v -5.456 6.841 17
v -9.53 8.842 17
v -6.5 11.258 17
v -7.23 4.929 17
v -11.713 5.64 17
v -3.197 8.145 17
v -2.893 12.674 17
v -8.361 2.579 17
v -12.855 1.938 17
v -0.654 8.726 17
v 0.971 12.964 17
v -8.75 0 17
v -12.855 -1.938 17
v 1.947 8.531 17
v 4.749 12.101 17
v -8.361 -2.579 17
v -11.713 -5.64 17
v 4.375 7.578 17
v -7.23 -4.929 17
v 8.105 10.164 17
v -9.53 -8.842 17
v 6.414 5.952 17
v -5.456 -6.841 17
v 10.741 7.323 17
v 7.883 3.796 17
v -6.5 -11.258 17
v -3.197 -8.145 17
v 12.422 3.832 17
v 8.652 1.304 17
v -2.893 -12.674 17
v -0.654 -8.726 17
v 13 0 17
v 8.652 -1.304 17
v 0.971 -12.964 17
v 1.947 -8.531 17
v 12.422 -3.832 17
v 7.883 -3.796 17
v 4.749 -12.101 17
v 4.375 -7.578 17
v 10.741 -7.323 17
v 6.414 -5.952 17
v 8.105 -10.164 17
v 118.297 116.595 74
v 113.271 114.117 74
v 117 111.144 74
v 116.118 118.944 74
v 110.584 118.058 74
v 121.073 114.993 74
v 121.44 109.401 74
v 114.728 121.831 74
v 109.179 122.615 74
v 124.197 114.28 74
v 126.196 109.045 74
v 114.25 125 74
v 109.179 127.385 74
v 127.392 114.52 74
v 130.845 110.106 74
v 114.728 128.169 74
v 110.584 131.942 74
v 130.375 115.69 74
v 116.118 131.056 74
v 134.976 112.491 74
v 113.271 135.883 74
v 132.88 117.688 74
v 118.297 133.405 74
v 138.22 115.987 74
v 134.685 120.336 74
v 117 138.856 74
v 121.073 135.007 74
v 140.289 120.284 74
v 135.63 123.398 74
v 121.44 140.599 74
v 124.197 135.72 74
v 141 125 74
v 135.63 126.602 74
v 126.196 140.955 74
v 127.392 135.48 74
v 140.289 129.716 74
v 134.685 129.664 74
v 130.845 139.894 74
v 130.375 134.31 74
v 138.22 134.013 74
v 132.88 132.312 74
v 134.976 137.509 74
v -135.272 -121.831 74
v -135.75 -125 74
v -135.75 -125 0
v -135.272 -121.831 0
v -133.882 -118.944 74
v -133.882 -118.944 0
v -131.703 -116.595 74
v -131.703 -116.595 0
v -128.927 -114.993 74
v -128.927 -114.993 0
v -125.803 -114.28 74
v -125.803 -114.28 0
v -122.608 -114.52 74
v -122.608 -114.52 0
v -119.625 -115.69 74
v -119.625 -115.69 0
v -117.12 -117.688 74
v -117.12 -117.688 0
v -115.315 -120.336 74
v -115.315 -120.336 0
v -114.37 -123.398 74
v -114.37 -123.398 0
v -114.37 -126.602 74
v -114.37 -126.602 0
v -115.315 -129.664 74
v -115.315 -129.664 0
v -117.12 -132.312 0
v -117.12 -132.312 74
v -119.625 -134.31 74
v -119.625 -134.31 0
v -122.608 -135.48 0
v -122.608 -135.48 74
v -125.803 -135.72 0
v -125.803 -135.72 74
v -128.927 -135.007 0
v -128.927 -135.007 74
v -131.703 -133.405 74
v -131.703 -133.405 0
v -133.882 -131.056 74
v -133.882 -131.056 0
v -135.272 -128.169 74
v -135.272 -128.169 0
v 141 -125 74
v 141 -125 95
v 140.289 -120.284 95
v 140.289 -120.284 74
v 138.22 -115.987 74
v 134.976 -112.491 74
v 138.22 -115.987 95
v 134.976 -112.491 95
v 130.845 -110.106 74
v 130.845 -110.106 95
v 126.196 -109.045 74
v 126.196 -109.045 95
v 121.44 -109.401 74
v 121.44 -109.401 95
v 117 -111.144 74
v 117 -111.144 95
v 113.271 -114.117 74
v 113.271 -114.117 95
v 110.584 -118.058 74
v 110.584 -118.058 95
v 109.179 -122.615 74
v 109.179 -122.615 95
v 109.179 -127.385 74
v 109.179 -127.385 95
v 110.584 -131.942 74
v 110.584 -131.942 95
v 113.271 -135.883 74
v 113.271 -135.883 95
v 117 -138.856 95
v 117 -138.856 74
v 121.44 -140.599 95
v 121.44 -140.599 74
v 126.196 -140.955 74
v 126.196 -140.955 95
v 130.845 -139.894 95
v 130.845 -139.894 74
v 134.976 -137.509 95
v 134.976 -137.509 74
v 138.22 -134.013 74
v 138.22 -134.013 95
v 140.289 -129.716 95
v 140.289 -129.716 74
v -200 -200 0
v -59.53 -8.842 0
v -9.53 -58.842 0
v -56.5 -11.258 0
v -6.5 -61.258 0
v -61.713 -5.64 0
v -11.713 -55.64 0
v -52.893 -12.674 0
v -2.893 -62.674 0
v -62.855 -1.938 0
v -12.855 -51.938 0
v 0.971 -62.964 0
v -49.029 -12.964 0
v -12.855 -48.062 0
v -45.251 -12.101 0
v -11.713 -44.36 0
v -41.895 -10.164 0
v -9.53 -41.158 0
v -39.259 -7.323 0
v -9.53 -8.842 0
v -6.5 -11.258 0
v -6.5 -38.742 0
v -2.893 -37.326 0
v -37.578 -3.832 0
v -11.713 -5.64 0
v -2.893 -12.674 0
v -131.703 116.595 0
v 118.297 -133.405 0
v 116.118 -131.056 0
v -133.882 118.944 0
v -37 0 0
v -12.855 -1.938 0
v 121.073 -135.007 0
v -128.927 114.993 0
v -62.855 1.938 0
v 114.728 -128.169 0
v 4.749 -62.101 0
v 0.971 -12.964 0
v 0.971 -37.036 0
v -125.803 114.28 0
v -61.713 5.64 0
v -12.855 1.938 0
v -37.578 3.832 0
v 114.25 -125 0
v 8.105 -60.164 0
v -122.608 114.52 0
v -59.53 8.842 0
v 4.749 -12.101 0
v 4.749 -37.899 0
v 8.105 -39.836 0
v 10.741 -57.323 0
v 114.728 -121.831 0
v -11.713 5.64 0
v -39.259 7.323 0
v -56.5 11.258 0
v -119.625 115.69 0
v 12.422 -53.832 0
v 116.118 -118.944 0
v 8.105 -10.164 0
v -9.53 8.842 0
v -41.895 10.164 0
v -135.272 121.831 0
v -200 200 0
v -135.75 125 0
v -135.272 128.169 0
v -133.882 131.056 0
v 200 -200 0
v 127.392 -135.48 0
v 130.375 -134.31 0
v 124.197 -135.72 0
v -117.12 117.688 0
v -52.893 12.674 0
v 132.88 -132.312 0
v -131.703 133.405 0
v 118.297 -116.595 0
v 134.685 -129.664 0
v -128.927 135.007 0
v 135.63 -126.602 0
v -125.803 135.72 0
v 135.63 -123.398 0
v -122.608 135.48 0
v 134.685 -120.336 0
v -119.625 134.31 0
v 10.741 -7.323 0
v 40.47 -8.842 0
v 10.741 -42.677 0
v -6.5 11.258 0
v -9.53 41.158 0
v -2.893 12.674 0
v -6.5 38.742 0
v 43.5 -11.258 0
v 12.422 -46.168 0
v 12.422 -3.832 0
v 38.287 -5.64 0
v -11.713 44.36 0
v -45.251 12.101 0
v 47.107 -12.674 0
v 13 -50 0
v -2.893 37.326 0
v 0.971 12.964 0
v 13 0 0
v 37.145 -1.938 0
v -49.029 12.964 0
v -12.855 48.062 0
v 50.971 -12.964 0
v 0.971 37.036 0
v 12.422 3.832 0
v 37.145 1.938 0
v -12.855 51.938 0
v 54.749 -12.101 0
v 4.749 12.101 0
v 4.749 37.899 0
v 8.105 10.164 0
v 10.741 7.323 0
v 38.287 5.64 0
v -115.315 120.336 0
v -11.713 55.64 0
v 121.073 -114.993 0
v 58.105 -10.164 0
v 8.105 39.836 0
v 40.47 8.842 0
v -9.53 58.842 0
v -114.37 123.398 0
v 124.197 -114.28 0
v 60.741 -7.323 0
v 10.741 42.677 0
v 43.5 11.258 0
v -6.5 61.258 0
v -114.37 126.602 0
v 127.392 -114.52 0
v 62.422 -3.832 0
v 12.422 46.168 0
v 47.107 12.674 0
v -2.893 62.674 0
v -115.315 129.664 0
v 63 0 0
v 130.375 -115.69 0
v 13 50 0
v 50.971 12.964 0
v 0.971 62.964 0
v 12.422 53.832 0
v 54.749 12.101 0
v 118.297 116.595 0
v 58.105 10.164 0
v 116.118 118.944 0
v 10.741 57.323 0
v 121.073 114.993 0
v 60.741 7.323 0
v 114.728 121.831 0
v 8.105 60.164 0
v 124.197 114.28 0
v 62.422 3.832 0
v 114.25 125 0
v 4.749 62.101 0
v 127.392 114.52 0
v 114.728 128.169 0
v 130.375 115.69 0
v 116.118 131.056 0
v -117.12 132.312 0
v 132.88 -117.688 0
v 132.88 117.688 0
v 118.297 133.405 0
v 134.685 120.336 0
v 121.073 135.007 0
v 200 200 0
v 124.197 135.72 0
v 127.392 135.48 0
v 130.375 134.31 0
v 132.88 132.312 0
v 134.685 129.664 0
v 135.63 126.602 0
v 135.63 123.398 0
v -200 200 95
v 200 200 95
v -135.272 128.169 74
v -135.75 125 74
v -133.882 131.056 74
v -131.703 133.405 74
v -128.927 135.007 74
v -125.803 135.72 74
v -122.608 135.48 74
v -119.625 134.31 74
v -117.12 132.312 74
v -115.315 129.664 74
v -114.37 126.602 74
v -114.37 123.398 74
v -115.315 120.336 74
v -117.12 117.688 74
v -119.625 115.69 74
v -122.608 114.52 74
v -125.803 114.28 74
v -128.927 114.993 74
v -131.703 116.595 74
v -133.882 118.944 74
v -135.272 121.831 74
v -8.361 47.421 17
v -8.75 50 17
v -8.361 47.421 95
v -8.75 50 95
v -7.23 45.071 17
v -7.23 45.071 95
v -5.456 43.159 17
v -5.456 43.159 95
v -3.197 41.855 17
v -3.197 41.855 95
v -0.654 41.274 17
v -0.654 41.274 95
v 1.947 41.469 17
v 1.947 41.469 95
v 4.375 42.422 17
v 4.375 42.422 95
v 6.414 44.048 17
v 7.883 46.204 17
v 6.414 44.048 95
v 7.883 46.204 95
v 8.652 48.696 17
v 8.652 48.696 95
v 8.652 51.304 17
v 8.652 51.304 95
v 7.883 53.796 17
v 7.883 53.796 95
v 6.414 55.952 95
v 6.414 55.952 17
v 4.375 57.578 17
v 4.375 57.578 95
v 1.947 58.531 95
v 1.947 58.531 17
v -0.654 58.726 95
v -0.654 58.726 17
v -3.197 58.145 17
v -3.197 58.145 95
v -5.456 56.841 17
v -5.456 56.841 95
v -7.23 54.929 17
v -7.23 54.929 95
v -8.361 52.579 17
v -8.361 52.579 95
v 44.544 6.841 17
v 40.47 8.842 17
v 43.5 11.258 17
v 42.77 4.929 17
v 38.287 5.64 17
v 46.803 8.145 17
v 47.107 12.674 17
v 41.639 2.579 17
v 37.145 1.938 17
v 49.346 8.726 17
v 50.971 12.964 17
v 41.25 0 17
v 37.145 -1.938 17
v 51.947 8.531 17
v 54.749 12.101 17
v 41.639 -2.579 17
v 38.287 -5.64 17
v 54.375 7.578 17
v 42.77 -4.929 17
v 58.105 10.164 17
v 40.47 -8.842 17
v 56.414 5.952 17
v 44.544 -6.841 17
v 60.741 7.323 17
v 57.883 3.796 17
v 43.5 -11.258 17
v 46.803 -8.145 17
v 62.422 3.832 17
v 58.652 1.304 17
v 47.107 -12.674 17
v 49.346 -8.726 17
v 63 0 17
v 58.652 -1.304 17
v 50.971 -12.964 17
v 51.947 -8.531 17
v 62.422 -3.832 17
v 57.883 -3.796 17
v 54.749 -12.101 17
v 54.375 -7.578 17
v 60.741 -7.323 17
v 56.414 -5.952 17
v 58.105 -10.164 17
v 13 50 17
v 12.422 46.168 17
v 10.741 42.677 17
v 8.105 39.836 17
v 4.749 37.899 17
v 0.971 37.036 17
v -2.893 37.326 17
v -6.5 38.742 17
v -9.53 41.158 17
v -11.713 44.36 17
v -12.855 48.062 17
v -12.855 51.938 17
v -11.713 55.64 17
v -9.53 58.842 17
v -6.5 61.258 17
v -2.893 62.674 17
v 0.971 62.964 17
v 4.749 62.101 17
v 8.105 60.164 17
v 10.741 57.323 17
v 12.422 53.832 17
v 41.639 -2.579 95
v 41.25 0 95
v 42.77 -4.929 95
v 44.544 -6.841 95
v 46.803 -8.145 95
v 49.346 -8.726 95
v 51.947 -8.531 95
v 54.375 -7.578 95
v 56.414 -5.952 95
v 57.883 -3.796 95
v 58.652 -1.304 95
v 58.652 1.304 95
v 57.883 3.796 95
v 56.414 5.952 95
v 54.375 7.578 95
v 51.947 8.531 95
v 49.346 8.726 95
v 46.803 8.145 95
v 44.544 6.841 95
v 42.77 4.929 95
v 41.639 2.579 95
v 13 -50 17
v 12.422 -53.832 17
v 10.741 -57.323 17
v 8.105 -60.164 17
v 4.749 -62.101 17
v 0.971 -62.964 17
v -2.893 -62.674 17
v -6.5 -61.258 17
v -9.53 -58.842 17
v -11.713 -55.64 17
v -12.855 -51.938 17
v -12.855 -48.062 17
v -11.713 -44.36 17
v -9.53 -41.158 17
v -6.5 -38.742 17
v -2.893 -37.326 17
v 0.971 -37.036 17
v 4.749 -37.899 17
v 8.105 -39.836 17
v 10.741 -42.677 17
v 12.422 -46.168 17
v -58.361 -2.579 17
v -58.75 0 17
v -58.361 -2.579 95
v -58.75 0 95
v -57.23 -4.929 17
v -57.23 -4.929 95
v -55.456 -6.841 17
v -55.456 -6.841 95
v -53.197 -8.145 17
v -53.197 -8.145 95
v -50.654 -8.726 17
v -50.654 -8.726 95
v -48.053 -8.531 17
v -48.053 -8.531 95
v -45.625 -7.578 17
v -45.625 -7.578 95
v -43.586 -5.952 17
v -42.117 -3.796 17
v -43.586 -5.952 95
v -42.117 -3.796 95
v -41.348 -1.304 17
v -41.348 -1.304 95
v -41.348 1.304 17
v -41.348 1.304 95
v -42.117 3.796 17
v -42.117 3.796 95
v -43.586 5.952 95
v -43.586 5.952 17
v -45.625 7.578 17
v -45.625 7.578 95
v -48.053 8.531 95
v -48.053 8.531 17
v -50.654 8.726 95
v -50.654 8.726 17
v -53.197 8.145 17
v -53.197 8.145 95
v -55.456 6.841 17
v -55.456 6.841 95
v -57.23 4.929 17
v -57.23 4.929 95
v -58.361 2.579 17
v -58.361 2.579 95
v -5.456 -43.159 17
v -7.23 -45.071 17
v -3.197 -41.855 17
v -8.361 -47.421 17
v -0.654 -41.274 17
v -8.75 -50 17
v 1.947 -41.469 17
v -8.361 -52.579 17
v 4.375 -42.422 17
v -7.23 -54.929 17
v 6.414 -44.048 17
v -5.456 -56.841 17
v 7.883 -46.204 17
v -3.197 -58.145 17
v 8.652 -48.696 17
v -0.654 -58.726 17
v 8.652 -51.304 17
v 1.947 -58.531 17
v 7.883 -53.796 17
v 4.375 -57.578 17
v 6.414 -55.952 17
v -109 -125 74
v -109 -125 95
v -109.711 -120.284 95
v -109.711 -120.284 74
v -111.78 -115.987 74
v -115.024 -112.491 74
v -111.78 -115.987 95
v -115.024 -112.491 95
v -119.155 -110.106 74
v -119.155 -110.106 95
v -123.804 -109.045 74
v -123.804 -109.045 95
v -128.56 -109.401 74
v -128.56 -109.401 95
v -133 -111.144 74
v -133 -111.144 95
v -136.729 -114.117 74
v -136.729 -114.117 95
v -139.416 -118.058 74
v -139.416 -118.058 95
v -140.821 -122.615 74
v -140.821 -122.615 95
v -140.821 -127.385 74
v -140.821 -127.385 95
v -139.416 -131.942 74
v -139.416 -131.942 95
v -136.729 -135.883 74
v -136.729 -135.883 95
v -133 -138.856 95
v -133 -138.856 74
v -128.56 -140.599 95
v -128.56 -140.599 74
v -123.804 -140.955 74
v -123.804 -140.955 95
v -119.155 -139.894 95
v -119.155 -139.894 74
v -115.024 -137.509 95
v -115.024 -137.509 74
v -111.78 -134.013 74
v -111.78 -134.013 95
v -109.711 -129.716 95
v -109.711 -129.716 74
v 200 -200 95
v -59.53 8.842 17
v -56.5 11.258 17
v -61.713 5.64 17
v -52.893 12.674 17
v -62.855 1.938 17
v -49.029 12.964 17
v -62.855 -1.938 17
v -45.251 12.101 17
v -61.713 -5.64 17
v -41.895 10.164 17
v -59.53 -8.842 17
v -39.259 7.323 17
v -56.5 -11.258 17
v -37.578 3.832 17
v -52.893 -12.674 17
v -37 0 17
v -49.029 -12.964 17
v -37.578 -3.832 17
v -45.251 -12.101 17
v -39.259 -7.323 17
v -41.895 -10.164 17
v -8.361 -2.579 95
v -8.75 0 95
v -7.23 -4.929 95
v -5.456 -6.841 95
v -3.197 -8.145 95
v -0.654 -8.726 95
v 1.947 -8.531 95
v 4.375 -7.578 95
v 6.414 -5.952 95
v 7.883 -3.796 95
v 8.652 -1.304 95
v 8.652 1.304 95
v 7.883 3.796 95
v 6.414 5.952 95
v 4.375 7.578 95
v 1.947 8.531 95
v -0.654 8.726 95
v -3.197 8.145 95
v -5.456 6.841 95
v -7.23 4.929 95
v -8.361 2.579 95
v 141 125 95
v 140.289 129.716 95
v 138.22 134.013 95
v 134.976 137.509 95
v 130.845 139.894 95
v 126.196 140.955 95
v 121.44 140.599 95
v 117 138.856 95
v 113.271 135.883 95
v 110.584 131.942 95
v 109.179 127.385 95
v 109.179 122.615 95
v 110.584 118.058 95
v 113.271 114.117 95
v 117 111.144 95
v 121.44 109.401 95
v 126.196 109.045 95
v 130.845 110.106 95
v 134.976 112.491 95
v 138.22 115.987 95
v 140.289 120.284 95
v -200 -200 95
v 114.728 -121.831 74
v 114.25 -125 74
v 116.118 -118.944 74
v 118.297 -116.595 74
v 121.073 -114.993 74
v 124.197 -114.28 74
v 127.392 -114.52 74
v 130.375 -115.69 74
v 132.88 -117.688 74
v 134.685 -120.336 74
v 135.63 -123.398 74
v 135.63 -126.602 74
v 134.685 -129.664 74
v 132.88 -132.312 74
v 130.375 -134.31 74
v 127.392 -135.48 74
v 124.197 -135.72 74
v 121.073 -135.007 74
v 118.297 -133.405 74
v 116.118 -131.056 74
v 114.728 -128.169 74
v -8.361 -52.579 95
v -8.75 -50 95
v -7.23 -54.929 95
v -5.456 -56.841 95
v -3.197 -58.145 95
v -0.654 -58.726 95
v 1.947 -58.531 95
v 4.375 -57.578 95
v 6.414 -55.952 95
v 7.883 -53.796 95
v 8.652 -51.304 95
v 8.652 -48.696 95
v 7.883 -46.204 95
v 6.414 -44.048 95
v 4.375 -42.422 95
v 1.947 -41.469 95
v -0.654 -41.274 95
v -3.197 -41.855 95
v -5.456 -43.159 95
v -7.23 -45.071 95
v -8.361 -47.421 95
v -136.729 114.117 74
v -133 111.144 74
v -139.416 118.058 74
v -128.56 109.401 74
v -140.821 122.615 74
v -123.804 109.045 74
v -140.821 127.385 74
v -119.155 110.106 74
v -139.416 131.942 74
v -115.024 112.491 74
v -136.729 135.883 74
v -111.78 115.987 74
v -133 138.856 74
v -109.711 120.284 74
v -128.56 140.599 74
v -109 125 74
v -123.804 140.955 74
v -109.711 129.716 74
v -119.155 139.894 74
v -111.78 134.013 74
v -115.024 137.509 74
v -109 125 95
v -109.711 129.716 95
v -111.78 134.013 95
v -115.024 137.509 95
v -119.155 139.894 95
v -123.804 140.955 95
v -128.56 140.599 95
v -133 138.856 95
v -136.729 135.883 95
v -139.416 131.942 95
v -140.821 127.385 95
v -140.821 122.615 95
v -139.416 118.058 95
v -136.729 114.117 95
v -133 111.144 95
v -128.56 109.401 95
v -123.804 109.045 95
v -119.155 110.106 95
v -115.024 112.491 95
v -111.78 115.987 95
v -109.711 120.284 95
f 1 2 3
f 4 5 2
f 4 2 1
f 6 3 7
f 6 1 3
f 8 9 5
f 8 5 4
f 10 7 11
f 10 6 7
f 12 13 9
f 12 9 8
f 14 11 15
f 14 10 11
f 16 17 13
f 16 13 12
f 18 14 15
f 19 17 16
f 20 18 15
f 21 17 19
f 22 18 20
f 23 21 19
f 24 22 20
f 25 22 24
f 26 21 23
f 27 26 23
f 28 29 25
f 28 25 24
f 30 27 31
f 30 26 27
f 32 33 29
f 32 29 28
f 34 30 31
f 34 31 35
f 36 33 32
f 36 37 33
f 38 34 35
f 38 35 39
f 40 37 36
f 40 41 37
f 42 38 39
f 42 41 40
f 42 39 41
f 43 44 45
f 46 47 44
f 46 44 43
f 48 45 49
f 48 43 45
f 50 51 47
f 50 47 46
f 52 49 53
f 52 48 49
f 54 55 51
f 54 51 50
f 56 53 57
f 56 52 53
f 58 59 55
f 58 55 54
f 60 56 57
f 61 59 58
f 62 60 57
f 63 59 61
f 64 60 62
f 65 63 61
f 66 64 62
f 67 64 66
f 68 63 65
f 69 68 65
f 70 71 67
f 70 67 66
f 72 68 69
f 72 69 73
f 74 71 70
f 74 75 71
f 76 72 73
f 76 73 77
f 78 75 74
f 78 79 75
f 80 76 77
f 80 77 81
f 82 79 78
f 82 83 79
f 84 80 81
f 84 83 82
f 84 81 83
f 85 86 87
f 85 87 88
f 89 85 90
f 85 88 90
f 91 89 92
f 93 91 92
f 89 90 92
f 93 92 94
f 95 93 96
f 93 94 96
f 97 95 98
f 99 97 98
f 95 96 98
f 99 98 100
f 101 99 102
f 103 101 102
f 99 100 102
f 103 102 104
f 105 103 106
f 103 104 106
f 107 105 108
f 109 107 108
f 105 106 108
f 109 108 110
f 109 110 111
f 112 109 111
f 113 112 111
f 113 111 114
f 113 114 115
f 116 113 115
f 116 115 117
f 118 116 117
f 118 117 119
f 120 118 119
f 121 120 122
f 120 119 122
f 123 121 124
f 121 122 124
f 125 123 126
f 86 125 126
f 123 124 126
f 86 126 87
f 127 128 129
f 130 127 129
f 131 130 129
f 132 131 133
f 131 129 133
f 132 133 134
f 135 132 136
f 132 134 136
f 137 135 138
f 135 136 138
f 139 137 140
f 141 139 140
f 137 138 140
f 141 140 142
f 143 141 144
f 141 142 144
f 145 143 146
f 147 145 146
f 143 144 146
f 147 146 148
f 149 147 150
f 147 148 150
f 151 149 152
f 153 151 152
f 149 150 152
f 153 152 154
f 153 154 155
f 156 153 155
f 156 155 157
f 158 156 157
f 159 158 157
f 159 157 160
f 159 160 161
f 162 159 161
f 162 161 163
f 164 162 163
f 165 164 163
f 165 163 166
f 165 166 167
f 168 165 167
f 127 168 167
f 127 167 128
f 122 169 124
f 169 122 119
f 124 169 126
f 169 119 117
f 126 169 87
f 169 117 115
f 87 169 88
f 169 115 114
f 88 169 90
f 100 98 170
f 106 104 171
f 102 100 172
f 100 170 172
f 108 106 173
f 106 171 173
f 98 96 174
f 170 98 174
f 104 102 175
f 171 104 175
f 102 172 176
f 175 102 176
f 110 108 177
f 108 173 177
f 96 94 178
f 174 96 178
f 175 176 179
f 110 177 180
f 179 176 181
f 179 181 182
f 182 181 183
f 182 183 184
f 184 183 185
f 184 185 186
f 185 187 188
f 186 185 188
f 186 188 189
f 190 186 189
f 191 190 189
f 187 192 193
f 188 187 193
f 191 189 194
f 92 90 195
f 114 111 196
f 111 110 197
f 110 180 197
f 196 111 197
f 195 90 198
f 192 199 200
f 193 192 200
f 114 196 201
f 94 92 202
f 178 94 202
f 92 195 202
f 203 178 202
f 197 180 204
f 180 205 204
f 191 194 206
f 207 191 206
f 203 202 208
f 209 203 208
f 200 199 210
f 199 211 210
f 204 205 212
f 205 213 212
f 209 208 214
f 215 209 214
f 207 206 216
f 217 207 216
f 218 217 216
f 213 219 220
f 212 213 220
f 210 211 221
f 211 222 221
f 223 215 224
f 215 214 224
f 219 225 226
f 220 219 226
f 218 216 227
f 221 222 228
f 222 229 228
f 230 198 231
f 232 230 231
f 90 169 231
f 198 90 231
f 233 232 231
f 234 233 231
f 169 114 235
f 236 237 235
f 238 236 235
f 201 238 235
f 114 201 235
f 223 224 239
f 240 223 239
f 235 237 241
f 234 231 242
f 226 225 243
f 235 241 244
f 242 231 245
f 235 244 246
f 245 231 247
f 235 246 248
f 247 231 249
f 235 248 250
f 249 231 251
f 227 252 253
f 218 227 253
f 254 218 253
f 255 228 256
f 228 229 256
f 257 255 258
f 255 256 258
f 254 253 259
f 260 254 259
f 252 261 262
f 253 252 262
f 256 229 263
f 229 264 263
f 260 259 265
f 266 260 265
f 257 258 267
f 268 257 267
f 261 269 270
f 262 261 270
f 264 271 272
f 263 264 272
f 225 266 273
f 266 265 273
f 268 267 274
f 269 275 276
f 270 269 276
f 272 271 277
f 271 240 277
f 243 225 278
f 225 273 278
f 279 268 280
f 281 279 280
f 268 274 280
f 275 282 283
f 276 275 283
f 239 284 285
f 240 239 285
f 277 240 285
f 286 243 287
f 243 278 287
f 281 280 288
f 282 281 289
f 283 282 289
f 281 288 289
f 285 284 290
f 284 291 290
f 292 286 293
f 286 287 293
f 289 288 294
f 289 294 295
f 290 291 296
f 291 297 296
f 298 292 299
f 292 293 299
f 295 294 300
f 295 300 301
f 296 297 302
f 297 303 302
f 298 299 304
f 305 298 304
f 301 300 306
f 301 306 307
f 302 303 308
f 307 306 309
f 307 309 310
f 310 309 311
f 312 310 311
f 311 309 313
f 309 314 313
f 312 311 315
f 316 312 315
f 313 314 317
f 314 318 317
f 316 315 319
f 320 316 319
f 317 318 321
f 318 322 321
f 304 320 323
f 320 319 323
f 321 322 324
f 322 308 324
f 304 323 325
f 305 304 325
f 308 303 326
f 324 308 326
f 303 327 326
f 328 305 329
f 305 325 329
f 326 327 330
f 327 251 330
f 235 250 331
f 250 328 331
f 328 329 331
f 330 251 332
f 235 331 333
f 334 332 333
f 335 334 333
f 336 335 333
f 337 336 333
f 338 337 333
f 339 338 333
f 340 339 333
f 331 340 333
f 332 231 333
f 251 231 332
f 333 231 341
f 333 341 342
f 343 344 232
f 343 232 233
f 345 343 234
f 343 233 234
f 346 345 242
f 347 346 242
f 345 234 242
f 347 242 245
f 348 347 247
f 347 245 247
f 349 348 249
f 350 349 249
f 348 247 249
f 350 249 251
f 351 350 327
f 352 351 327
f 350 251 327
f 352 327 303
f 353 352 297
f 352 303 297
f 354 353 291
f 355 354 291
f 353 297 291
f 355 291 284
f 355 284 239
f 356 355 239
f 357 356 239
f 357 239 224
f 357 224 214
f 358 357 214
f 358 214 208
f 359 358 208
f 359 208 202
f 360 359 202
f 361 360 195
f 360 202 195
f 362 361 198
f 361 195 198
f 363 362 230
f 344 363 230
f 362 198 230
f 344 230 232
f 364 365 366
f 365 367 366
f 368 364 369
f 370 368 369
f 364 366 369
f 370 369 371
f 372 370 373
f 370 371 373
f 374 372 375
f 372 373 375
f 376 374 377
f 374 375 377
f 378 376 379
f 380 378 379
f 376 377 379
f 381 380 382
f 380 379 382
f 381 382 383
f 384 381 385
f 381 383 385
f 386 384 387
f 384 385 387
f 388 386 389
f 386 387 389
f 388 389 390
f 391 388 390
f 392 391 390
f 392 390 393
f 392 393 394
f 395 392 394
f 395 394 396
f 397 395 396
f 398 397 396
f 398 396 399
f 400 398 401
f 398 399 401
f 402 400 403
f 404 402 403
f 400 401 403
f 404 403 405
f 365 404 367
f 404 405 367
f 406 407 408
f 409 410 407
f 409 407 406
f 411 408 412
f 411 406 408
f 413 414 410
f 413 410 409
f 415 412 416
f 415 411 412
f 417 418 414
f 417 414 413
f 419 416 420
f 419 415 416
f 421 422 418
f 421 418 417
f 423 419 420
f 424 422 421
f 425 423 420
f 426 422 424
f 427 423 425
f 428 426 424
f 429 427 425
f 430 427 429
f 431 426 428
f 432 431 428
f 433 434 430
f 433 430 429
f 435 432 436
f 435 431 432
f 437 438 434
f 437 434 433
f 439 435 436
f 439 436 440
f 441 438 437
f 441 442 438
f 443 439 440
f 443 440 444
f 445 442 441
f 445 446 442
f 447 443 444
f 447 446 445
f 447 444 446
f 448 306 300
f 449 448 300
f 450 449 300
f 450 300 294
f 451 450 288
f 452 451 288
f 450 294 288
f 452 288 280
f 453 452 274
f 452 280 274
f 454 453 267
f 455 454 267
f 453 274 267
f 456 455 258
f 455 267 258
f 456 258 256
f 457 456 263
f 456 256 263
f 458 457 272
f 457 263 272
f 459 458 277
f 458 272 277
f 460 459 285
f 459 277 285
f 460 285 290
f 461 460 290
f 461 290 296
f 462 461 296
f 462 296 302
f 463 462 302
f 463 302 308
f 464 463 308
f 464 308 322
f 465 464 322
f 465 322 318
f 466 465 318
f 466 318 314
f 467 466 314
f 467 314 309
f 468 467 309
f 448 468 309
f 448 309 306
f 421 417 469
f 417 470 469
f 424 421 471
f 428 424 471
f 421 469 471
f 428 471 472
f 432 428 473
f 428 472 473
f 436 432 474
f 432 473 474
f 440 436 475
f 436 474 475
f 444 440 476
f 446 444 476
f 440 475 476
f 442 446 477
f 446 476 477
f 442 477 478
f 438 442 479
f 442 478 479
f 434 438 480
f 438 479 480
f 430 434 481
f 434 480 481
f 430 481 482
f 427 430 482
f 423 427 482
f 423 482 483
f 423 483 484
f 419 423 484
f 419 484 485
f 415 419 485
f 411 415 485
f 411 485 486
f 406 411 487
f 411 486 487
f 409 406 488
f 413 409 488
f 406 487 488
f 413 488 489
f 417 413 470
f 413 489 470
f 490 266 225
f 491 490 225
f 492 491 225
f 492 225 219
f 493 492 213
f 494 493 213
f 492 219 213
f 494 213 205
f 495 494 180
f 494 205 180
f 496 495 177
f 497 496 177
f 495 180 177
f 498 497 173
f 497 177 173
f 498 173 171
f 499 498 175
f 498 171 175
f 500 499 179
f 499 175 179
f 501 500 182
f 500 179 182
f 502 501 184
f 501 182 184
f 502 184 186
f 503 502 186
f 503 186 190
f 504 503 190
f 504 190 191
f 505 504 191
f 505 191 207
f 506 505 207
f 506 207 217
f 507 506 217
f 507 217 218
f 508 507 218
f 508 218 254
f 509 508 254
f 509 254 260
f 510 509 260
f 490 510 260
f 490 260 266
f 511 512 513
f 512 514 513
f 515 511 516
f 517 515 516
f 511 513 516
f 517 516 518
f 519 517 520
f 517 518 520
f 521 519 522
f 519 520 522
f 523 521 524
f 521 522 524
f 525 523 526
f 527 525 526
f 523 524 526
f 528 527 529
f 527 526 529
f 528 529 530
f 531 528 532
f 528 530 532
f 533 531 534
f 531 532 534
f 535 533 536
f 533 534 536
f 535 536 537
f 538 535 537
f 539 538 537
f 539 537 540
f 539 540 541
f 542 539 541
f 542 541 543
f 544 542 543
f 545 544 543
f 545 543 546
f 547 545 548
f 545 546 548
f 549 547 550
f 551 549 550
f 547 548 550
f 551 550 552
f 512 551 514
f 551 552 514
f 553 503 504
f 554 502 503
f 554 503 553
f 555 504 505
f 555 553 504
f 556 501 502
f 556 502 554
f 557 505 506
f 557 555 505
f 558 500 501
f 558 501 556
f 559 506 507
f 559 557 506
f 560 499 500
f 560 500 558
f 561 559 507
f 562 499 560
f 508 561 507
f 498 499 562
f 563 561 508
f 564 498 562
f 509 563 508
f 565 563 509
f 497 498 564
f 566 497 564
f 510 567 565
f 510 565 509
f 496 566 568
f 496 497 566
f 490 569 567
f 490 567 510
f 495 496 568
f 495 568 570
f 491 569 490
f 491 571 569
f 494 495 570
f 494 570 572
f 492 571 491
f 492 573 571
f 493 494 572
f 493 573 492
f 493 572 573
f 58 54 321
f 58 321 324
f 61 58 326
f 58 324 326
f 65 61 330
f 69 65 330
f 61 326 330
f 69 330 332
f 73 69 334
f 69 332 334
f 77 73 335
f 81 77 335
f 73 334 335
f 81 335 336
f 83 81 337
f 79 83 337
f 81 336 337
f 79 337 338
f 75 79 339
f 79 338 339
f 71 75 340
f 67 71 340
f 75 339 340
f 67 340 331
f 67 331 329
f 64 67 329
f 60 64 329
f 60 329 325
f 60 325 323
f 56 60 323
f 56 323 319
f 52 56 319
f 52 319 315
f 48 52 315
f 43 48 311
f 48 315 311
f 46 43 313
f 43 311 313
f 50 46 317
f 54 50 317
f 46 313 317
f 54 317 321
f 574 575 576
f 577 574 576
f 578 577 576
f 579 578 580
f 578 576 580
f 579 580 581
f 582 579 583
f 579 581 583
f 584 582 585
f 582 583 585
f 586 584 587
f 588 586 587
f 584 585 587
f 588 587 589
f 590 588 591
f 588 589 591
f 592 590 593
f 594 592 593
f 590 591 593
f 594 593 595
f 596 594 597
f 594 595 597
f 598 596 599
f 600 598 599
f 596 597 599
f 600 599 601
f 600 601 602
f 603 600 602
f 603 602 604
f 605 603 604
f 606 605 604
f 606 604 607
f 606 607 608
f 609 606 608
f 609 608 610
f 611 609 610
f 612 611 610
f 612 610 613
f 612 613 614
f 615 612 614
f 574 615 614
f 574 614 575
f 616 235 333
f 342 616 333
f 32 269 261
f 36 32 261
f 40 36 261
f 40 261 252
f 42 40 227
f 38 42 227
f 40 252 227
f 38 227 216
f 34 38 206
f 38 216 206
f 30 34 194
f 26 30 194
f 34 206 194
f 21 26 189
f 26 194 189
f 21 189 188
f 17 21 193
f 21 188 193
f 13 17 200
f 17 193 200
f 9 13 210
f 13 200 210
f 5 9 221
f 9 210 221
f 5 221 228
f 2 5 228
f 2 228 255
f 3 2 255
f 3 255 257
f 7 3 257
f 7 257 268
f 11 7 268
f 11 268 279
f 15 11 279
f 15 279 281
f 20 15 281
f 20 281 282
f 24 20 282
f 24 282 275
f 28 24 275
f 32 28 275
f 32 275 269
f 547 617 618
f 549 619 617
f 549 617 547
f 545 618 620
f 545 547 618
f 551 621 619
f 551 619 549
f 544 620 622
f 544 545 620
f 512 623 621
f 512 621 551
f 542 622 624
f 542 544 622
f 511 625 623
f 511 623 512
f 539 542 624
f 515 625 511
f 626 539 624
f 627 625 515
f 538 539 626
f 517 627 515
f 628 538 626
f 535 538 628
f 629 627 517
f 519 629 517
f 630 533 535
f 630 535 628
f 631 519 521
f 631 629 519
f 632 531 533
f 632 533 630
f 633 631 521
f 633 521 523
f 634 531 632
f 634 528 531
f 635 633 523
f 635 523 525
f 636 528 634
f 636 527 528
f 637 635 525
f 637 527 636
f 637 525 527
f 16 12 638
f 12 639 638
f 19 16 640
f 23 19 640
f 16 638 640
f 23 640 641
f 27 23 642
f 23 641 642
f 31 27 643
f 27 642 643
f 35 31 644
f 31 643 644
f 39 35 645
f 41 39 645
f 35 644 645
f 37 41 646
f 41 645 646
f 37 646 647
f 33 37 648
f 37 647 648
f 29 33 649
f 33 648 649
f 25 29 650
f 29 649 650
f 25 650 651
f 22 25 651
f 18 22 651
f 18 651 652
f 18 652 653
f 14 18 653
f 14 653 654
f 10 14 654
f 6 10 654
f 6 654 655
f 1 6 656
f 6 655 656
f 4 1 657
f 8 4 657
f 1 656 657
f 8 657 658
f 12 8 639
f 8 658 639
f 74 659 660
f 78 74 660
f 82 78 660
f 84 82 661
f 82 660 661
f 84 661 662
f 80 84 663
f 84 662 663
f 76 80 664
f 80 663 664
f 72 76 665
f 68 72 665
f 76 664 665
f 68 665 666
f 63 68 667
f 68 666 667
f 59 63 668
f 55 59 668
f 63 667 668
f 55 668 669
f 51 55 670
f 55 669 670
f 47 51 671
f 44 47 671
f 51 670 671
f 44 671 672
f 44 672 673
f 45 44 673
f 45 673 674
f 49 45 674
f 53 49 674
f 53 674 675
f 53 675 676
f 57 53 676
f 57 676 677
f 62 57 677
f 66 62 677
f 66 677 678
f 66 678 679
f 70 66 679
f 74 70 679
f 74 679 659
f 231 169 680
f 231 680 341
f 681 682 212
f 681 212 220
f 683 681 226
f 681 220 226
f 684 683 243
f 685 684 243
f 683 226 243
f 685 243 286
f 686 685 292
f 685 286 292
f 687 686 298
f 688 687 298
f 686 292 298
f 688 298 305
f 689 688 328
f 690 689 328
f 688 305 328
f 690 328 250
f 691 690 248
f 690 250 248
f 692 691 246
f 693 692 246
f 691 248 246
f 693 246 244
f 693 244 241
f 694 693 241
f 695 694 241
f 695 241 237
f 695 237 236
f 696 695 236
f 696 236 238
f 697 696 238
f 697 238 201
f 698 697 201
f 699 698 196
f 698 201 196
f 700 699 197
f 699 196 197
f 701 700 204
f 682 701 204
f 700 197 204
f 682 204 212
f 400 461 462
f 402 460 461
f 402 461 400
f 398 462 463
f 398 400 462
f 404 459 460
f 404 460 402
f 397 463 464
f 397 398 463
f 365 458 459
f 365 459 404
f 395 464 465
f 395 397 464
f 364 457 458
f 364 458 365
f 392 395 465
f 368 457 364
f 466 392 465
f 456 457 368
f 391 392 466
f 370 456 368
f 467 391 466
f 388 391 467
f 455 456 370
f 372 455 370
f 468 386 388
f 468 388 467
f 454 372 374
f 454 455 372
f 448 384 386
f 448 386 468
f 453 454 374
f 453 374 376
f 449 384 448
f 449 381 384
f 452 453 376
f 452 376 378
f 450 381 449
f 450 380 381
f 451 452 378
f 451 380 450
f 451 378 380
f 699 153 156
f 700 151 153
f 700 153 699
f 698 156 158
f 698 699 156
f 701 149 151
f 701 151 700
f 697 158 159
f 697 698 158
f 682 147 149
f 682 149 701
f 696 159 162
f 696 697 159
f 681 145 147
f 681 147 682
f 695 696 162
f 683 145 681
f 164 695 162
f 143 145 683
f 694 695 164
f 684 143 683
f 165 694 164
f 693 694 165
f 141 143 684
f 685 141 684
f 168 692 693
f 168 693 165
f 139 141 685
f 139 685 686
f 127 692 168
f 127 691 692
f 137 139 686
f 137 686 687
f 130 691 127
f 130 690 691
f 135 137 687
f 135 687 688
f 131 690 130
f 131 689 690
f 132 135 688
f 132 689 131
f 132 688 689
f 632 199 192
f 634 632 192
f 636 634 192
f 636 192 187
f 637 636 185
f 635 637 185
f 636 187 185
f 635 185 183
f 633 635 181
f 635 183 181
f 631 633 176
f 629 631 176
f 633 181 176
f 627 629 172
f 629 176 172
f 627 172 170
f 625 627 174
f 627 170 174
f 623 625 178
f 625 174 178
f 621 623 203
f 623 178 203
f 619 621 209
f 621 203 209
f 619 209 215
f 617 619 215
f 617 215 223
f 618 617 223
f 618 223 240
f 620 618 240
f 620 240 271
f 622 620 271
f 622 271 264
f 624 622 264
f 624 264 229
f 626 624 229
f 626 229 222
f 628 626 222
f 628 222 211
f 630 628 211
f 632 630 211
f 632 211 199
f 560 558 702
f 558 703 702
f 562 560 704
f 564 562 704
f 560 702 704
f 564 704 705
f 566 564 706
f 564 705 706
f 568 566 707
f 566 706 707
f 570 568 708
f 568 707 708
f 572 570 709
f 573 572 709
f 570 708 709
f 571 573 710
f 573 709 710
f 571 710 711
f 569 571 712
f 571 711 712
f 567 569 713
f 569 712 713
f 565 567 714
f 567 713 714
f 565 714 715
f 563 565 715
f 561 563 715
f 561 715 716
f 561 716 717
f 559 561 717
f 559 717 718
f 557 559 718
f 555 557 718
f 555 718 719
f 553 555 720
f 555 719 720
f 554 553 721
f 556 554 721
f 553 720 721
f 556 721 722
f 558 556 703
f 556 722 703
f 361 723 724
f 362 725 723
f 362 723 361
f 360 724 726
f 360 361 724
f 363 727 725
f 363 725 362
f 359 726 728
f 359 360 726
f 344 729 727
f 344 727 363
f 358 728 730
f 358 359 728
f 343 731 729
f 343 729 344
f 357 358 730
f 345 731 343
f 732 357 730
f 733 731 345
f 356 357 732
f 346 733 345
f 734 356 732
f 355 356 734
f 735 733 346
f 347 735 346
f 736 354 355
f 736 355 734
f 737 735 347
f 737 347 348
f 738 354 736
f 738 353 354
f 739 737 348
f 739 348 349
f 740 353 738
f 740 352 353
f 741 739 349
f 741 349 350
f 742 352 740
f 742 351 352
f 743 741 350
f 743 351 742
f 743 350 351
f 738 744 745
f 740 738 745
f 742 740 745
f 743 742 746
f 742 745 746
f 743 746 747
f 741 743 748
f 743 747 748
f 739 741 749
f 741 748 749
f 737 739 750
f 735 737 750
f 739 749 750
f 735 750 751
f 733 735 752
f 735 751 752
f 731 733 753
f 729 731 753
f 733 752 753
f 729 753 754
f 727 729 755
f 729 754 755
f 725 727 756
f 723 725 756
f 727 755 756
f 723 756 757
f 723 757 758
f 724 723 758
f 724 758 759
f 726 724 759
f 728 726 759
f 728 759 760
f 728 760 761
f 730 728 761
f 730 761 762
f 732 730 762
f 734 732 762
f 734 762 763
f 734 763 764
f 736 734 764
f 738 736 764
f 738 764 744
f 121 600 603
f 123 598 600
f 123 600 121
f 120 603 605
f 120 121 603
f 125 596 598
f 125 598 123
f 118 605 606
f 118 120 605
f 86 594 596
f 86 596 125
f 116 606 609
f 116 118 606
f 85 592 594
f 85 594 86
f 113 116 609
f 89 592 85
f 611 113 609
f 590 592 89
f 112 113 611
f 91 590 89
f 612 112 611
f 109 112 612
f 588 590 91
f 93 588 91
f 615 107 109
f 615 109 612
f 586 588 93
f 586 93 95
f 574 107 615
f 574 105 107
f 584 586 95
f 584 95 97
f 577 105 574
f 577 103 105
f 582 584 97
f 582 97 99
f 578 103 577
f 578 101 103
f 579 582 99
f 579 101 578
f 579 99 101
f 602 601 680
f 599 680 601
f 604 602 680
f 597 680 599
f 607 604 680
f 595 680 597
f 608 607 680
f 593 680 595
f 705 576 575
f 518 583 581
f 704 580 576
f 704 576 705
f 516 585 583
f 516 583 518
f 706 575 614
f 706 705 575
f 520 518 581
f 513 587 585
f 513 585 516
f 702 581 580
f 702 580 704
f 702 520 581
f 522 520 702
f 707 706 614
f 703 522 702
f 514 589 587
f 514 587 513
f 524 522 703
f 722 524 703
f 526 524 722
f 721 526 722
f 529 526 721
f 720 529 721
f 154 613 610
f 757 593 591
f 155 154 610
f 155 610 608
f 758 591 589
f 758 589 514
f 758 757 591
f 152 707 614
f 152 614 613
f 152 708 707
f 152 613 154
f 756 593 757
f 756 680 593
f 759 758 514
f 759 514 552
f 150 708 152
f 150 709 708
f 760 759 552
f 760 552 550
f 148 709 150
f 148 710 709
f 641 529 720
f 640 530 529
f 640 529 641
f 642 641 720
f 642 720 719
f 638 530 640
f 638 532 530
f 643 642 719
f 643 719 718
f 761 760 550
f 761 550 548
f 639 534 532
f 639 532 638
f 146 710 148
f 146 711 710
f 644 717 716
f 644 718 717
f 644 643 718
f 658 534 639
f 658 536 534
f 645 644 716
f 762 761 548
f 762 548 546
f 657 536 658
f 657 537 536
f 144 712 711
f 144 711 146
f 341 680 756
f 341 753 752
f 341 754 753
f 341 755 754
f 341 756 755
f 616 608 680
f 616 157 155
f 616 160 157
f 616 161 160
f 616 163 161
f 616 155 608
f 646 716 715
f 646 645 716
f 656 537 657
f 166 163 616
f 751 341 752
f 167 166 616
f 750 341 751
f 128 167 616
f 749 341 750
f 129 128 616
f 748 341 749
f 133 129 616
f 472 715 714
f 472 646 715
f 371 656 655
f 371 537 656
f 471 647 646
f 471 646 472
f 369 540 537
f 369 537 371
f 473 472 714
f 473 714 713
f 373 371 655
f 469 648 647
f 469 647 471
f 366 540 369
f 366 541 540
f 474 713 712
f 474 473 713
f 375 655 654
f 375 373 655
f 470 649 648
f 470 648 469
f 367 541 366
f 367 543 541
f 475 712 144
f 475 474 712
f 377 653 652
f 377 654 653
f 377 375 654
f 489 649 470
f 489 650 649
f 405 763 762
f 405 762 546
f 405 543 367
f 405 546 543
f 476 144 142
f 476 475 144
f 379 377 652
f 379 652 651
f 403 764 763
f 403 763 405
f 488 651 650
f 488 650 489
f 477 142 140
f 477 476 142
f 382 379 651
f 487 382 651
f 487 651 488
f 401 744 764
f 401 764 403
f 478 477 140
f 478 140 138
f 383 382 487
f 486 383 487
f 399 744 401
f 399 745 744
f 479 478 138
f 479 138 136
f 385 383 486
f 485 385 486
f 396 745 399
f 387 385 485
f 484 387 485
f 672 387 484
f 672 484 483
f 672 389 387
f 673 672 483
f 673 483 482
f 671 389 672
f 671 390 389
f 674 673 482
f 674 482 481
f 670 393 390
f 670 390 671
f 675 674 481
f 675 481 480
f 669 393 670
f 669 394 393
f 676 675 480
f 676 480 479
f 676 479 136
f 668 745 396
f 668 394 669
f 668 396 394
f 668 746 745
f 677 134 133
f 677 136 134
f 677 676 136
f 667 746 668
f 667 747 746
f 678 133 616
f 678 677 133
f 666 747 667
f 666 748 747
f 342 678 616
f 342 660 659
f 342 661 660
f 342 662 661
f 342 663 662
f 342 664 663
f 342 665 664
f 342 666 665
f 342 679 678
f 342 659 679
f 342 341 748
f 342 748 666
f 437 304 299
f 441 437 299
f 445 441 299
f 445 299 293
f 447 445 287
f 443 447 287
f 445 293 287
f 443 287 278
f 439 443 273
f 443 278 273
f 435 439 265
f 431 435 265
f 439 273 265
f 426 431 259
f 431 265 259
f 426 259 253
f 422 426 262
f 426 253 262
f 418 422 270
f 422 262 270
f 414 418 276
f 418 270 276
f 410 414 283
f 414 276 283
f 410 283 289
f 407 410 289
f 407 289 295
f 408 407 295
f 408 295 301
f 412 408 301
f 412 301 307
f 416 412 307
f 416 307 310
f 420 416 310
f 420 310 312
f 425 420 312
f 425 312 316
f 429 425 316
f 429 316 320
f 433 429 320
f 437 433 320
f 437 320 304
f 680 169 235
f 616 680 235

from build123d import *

# Parameters (mm, degrees)
F0_W           = 400
F0_H           = 400
F1_DEPTH       = 95
F3_D           = 17.5
F3_CBORE_D     = 26
F3_CBORE_DEPTH = 17
F5_D           = 21.5
F5_CBORE_D     = 32
F5_CBORE_DEPTH = 21


with BuildPart() as f1:
    # F0 (on Top) → F1 (new body)
    with BuildSketch(Plane.XY):
        Rectangle(F0_W, F0_H)
    extrude(amount=F1_DEPTH)

    # F3 (through all)
    with Locations(Plane(origin=(0, 0, 0), x_dir=(1, 0, 0), z_dir=(0, 0, -1))):
        with Locations((0, 0), (0, 50), (-50, 0), (0, -50), (50, 0)):
            CounterBoreHole(F3_D / 2, F3_CBORE_D / 2, F3_CBORE_DEPTH)

    # F5 (through all)
    with Locations(Plane.XY.offset(95)):
        with Locations((-125, 125), (125, 125), (-125, -125), (125, -125)):
            CounterBoreHole(F5_D / 2, F5_CBORE_D / 2, F5_CBORE_DEPTH)


solid = f1.part
